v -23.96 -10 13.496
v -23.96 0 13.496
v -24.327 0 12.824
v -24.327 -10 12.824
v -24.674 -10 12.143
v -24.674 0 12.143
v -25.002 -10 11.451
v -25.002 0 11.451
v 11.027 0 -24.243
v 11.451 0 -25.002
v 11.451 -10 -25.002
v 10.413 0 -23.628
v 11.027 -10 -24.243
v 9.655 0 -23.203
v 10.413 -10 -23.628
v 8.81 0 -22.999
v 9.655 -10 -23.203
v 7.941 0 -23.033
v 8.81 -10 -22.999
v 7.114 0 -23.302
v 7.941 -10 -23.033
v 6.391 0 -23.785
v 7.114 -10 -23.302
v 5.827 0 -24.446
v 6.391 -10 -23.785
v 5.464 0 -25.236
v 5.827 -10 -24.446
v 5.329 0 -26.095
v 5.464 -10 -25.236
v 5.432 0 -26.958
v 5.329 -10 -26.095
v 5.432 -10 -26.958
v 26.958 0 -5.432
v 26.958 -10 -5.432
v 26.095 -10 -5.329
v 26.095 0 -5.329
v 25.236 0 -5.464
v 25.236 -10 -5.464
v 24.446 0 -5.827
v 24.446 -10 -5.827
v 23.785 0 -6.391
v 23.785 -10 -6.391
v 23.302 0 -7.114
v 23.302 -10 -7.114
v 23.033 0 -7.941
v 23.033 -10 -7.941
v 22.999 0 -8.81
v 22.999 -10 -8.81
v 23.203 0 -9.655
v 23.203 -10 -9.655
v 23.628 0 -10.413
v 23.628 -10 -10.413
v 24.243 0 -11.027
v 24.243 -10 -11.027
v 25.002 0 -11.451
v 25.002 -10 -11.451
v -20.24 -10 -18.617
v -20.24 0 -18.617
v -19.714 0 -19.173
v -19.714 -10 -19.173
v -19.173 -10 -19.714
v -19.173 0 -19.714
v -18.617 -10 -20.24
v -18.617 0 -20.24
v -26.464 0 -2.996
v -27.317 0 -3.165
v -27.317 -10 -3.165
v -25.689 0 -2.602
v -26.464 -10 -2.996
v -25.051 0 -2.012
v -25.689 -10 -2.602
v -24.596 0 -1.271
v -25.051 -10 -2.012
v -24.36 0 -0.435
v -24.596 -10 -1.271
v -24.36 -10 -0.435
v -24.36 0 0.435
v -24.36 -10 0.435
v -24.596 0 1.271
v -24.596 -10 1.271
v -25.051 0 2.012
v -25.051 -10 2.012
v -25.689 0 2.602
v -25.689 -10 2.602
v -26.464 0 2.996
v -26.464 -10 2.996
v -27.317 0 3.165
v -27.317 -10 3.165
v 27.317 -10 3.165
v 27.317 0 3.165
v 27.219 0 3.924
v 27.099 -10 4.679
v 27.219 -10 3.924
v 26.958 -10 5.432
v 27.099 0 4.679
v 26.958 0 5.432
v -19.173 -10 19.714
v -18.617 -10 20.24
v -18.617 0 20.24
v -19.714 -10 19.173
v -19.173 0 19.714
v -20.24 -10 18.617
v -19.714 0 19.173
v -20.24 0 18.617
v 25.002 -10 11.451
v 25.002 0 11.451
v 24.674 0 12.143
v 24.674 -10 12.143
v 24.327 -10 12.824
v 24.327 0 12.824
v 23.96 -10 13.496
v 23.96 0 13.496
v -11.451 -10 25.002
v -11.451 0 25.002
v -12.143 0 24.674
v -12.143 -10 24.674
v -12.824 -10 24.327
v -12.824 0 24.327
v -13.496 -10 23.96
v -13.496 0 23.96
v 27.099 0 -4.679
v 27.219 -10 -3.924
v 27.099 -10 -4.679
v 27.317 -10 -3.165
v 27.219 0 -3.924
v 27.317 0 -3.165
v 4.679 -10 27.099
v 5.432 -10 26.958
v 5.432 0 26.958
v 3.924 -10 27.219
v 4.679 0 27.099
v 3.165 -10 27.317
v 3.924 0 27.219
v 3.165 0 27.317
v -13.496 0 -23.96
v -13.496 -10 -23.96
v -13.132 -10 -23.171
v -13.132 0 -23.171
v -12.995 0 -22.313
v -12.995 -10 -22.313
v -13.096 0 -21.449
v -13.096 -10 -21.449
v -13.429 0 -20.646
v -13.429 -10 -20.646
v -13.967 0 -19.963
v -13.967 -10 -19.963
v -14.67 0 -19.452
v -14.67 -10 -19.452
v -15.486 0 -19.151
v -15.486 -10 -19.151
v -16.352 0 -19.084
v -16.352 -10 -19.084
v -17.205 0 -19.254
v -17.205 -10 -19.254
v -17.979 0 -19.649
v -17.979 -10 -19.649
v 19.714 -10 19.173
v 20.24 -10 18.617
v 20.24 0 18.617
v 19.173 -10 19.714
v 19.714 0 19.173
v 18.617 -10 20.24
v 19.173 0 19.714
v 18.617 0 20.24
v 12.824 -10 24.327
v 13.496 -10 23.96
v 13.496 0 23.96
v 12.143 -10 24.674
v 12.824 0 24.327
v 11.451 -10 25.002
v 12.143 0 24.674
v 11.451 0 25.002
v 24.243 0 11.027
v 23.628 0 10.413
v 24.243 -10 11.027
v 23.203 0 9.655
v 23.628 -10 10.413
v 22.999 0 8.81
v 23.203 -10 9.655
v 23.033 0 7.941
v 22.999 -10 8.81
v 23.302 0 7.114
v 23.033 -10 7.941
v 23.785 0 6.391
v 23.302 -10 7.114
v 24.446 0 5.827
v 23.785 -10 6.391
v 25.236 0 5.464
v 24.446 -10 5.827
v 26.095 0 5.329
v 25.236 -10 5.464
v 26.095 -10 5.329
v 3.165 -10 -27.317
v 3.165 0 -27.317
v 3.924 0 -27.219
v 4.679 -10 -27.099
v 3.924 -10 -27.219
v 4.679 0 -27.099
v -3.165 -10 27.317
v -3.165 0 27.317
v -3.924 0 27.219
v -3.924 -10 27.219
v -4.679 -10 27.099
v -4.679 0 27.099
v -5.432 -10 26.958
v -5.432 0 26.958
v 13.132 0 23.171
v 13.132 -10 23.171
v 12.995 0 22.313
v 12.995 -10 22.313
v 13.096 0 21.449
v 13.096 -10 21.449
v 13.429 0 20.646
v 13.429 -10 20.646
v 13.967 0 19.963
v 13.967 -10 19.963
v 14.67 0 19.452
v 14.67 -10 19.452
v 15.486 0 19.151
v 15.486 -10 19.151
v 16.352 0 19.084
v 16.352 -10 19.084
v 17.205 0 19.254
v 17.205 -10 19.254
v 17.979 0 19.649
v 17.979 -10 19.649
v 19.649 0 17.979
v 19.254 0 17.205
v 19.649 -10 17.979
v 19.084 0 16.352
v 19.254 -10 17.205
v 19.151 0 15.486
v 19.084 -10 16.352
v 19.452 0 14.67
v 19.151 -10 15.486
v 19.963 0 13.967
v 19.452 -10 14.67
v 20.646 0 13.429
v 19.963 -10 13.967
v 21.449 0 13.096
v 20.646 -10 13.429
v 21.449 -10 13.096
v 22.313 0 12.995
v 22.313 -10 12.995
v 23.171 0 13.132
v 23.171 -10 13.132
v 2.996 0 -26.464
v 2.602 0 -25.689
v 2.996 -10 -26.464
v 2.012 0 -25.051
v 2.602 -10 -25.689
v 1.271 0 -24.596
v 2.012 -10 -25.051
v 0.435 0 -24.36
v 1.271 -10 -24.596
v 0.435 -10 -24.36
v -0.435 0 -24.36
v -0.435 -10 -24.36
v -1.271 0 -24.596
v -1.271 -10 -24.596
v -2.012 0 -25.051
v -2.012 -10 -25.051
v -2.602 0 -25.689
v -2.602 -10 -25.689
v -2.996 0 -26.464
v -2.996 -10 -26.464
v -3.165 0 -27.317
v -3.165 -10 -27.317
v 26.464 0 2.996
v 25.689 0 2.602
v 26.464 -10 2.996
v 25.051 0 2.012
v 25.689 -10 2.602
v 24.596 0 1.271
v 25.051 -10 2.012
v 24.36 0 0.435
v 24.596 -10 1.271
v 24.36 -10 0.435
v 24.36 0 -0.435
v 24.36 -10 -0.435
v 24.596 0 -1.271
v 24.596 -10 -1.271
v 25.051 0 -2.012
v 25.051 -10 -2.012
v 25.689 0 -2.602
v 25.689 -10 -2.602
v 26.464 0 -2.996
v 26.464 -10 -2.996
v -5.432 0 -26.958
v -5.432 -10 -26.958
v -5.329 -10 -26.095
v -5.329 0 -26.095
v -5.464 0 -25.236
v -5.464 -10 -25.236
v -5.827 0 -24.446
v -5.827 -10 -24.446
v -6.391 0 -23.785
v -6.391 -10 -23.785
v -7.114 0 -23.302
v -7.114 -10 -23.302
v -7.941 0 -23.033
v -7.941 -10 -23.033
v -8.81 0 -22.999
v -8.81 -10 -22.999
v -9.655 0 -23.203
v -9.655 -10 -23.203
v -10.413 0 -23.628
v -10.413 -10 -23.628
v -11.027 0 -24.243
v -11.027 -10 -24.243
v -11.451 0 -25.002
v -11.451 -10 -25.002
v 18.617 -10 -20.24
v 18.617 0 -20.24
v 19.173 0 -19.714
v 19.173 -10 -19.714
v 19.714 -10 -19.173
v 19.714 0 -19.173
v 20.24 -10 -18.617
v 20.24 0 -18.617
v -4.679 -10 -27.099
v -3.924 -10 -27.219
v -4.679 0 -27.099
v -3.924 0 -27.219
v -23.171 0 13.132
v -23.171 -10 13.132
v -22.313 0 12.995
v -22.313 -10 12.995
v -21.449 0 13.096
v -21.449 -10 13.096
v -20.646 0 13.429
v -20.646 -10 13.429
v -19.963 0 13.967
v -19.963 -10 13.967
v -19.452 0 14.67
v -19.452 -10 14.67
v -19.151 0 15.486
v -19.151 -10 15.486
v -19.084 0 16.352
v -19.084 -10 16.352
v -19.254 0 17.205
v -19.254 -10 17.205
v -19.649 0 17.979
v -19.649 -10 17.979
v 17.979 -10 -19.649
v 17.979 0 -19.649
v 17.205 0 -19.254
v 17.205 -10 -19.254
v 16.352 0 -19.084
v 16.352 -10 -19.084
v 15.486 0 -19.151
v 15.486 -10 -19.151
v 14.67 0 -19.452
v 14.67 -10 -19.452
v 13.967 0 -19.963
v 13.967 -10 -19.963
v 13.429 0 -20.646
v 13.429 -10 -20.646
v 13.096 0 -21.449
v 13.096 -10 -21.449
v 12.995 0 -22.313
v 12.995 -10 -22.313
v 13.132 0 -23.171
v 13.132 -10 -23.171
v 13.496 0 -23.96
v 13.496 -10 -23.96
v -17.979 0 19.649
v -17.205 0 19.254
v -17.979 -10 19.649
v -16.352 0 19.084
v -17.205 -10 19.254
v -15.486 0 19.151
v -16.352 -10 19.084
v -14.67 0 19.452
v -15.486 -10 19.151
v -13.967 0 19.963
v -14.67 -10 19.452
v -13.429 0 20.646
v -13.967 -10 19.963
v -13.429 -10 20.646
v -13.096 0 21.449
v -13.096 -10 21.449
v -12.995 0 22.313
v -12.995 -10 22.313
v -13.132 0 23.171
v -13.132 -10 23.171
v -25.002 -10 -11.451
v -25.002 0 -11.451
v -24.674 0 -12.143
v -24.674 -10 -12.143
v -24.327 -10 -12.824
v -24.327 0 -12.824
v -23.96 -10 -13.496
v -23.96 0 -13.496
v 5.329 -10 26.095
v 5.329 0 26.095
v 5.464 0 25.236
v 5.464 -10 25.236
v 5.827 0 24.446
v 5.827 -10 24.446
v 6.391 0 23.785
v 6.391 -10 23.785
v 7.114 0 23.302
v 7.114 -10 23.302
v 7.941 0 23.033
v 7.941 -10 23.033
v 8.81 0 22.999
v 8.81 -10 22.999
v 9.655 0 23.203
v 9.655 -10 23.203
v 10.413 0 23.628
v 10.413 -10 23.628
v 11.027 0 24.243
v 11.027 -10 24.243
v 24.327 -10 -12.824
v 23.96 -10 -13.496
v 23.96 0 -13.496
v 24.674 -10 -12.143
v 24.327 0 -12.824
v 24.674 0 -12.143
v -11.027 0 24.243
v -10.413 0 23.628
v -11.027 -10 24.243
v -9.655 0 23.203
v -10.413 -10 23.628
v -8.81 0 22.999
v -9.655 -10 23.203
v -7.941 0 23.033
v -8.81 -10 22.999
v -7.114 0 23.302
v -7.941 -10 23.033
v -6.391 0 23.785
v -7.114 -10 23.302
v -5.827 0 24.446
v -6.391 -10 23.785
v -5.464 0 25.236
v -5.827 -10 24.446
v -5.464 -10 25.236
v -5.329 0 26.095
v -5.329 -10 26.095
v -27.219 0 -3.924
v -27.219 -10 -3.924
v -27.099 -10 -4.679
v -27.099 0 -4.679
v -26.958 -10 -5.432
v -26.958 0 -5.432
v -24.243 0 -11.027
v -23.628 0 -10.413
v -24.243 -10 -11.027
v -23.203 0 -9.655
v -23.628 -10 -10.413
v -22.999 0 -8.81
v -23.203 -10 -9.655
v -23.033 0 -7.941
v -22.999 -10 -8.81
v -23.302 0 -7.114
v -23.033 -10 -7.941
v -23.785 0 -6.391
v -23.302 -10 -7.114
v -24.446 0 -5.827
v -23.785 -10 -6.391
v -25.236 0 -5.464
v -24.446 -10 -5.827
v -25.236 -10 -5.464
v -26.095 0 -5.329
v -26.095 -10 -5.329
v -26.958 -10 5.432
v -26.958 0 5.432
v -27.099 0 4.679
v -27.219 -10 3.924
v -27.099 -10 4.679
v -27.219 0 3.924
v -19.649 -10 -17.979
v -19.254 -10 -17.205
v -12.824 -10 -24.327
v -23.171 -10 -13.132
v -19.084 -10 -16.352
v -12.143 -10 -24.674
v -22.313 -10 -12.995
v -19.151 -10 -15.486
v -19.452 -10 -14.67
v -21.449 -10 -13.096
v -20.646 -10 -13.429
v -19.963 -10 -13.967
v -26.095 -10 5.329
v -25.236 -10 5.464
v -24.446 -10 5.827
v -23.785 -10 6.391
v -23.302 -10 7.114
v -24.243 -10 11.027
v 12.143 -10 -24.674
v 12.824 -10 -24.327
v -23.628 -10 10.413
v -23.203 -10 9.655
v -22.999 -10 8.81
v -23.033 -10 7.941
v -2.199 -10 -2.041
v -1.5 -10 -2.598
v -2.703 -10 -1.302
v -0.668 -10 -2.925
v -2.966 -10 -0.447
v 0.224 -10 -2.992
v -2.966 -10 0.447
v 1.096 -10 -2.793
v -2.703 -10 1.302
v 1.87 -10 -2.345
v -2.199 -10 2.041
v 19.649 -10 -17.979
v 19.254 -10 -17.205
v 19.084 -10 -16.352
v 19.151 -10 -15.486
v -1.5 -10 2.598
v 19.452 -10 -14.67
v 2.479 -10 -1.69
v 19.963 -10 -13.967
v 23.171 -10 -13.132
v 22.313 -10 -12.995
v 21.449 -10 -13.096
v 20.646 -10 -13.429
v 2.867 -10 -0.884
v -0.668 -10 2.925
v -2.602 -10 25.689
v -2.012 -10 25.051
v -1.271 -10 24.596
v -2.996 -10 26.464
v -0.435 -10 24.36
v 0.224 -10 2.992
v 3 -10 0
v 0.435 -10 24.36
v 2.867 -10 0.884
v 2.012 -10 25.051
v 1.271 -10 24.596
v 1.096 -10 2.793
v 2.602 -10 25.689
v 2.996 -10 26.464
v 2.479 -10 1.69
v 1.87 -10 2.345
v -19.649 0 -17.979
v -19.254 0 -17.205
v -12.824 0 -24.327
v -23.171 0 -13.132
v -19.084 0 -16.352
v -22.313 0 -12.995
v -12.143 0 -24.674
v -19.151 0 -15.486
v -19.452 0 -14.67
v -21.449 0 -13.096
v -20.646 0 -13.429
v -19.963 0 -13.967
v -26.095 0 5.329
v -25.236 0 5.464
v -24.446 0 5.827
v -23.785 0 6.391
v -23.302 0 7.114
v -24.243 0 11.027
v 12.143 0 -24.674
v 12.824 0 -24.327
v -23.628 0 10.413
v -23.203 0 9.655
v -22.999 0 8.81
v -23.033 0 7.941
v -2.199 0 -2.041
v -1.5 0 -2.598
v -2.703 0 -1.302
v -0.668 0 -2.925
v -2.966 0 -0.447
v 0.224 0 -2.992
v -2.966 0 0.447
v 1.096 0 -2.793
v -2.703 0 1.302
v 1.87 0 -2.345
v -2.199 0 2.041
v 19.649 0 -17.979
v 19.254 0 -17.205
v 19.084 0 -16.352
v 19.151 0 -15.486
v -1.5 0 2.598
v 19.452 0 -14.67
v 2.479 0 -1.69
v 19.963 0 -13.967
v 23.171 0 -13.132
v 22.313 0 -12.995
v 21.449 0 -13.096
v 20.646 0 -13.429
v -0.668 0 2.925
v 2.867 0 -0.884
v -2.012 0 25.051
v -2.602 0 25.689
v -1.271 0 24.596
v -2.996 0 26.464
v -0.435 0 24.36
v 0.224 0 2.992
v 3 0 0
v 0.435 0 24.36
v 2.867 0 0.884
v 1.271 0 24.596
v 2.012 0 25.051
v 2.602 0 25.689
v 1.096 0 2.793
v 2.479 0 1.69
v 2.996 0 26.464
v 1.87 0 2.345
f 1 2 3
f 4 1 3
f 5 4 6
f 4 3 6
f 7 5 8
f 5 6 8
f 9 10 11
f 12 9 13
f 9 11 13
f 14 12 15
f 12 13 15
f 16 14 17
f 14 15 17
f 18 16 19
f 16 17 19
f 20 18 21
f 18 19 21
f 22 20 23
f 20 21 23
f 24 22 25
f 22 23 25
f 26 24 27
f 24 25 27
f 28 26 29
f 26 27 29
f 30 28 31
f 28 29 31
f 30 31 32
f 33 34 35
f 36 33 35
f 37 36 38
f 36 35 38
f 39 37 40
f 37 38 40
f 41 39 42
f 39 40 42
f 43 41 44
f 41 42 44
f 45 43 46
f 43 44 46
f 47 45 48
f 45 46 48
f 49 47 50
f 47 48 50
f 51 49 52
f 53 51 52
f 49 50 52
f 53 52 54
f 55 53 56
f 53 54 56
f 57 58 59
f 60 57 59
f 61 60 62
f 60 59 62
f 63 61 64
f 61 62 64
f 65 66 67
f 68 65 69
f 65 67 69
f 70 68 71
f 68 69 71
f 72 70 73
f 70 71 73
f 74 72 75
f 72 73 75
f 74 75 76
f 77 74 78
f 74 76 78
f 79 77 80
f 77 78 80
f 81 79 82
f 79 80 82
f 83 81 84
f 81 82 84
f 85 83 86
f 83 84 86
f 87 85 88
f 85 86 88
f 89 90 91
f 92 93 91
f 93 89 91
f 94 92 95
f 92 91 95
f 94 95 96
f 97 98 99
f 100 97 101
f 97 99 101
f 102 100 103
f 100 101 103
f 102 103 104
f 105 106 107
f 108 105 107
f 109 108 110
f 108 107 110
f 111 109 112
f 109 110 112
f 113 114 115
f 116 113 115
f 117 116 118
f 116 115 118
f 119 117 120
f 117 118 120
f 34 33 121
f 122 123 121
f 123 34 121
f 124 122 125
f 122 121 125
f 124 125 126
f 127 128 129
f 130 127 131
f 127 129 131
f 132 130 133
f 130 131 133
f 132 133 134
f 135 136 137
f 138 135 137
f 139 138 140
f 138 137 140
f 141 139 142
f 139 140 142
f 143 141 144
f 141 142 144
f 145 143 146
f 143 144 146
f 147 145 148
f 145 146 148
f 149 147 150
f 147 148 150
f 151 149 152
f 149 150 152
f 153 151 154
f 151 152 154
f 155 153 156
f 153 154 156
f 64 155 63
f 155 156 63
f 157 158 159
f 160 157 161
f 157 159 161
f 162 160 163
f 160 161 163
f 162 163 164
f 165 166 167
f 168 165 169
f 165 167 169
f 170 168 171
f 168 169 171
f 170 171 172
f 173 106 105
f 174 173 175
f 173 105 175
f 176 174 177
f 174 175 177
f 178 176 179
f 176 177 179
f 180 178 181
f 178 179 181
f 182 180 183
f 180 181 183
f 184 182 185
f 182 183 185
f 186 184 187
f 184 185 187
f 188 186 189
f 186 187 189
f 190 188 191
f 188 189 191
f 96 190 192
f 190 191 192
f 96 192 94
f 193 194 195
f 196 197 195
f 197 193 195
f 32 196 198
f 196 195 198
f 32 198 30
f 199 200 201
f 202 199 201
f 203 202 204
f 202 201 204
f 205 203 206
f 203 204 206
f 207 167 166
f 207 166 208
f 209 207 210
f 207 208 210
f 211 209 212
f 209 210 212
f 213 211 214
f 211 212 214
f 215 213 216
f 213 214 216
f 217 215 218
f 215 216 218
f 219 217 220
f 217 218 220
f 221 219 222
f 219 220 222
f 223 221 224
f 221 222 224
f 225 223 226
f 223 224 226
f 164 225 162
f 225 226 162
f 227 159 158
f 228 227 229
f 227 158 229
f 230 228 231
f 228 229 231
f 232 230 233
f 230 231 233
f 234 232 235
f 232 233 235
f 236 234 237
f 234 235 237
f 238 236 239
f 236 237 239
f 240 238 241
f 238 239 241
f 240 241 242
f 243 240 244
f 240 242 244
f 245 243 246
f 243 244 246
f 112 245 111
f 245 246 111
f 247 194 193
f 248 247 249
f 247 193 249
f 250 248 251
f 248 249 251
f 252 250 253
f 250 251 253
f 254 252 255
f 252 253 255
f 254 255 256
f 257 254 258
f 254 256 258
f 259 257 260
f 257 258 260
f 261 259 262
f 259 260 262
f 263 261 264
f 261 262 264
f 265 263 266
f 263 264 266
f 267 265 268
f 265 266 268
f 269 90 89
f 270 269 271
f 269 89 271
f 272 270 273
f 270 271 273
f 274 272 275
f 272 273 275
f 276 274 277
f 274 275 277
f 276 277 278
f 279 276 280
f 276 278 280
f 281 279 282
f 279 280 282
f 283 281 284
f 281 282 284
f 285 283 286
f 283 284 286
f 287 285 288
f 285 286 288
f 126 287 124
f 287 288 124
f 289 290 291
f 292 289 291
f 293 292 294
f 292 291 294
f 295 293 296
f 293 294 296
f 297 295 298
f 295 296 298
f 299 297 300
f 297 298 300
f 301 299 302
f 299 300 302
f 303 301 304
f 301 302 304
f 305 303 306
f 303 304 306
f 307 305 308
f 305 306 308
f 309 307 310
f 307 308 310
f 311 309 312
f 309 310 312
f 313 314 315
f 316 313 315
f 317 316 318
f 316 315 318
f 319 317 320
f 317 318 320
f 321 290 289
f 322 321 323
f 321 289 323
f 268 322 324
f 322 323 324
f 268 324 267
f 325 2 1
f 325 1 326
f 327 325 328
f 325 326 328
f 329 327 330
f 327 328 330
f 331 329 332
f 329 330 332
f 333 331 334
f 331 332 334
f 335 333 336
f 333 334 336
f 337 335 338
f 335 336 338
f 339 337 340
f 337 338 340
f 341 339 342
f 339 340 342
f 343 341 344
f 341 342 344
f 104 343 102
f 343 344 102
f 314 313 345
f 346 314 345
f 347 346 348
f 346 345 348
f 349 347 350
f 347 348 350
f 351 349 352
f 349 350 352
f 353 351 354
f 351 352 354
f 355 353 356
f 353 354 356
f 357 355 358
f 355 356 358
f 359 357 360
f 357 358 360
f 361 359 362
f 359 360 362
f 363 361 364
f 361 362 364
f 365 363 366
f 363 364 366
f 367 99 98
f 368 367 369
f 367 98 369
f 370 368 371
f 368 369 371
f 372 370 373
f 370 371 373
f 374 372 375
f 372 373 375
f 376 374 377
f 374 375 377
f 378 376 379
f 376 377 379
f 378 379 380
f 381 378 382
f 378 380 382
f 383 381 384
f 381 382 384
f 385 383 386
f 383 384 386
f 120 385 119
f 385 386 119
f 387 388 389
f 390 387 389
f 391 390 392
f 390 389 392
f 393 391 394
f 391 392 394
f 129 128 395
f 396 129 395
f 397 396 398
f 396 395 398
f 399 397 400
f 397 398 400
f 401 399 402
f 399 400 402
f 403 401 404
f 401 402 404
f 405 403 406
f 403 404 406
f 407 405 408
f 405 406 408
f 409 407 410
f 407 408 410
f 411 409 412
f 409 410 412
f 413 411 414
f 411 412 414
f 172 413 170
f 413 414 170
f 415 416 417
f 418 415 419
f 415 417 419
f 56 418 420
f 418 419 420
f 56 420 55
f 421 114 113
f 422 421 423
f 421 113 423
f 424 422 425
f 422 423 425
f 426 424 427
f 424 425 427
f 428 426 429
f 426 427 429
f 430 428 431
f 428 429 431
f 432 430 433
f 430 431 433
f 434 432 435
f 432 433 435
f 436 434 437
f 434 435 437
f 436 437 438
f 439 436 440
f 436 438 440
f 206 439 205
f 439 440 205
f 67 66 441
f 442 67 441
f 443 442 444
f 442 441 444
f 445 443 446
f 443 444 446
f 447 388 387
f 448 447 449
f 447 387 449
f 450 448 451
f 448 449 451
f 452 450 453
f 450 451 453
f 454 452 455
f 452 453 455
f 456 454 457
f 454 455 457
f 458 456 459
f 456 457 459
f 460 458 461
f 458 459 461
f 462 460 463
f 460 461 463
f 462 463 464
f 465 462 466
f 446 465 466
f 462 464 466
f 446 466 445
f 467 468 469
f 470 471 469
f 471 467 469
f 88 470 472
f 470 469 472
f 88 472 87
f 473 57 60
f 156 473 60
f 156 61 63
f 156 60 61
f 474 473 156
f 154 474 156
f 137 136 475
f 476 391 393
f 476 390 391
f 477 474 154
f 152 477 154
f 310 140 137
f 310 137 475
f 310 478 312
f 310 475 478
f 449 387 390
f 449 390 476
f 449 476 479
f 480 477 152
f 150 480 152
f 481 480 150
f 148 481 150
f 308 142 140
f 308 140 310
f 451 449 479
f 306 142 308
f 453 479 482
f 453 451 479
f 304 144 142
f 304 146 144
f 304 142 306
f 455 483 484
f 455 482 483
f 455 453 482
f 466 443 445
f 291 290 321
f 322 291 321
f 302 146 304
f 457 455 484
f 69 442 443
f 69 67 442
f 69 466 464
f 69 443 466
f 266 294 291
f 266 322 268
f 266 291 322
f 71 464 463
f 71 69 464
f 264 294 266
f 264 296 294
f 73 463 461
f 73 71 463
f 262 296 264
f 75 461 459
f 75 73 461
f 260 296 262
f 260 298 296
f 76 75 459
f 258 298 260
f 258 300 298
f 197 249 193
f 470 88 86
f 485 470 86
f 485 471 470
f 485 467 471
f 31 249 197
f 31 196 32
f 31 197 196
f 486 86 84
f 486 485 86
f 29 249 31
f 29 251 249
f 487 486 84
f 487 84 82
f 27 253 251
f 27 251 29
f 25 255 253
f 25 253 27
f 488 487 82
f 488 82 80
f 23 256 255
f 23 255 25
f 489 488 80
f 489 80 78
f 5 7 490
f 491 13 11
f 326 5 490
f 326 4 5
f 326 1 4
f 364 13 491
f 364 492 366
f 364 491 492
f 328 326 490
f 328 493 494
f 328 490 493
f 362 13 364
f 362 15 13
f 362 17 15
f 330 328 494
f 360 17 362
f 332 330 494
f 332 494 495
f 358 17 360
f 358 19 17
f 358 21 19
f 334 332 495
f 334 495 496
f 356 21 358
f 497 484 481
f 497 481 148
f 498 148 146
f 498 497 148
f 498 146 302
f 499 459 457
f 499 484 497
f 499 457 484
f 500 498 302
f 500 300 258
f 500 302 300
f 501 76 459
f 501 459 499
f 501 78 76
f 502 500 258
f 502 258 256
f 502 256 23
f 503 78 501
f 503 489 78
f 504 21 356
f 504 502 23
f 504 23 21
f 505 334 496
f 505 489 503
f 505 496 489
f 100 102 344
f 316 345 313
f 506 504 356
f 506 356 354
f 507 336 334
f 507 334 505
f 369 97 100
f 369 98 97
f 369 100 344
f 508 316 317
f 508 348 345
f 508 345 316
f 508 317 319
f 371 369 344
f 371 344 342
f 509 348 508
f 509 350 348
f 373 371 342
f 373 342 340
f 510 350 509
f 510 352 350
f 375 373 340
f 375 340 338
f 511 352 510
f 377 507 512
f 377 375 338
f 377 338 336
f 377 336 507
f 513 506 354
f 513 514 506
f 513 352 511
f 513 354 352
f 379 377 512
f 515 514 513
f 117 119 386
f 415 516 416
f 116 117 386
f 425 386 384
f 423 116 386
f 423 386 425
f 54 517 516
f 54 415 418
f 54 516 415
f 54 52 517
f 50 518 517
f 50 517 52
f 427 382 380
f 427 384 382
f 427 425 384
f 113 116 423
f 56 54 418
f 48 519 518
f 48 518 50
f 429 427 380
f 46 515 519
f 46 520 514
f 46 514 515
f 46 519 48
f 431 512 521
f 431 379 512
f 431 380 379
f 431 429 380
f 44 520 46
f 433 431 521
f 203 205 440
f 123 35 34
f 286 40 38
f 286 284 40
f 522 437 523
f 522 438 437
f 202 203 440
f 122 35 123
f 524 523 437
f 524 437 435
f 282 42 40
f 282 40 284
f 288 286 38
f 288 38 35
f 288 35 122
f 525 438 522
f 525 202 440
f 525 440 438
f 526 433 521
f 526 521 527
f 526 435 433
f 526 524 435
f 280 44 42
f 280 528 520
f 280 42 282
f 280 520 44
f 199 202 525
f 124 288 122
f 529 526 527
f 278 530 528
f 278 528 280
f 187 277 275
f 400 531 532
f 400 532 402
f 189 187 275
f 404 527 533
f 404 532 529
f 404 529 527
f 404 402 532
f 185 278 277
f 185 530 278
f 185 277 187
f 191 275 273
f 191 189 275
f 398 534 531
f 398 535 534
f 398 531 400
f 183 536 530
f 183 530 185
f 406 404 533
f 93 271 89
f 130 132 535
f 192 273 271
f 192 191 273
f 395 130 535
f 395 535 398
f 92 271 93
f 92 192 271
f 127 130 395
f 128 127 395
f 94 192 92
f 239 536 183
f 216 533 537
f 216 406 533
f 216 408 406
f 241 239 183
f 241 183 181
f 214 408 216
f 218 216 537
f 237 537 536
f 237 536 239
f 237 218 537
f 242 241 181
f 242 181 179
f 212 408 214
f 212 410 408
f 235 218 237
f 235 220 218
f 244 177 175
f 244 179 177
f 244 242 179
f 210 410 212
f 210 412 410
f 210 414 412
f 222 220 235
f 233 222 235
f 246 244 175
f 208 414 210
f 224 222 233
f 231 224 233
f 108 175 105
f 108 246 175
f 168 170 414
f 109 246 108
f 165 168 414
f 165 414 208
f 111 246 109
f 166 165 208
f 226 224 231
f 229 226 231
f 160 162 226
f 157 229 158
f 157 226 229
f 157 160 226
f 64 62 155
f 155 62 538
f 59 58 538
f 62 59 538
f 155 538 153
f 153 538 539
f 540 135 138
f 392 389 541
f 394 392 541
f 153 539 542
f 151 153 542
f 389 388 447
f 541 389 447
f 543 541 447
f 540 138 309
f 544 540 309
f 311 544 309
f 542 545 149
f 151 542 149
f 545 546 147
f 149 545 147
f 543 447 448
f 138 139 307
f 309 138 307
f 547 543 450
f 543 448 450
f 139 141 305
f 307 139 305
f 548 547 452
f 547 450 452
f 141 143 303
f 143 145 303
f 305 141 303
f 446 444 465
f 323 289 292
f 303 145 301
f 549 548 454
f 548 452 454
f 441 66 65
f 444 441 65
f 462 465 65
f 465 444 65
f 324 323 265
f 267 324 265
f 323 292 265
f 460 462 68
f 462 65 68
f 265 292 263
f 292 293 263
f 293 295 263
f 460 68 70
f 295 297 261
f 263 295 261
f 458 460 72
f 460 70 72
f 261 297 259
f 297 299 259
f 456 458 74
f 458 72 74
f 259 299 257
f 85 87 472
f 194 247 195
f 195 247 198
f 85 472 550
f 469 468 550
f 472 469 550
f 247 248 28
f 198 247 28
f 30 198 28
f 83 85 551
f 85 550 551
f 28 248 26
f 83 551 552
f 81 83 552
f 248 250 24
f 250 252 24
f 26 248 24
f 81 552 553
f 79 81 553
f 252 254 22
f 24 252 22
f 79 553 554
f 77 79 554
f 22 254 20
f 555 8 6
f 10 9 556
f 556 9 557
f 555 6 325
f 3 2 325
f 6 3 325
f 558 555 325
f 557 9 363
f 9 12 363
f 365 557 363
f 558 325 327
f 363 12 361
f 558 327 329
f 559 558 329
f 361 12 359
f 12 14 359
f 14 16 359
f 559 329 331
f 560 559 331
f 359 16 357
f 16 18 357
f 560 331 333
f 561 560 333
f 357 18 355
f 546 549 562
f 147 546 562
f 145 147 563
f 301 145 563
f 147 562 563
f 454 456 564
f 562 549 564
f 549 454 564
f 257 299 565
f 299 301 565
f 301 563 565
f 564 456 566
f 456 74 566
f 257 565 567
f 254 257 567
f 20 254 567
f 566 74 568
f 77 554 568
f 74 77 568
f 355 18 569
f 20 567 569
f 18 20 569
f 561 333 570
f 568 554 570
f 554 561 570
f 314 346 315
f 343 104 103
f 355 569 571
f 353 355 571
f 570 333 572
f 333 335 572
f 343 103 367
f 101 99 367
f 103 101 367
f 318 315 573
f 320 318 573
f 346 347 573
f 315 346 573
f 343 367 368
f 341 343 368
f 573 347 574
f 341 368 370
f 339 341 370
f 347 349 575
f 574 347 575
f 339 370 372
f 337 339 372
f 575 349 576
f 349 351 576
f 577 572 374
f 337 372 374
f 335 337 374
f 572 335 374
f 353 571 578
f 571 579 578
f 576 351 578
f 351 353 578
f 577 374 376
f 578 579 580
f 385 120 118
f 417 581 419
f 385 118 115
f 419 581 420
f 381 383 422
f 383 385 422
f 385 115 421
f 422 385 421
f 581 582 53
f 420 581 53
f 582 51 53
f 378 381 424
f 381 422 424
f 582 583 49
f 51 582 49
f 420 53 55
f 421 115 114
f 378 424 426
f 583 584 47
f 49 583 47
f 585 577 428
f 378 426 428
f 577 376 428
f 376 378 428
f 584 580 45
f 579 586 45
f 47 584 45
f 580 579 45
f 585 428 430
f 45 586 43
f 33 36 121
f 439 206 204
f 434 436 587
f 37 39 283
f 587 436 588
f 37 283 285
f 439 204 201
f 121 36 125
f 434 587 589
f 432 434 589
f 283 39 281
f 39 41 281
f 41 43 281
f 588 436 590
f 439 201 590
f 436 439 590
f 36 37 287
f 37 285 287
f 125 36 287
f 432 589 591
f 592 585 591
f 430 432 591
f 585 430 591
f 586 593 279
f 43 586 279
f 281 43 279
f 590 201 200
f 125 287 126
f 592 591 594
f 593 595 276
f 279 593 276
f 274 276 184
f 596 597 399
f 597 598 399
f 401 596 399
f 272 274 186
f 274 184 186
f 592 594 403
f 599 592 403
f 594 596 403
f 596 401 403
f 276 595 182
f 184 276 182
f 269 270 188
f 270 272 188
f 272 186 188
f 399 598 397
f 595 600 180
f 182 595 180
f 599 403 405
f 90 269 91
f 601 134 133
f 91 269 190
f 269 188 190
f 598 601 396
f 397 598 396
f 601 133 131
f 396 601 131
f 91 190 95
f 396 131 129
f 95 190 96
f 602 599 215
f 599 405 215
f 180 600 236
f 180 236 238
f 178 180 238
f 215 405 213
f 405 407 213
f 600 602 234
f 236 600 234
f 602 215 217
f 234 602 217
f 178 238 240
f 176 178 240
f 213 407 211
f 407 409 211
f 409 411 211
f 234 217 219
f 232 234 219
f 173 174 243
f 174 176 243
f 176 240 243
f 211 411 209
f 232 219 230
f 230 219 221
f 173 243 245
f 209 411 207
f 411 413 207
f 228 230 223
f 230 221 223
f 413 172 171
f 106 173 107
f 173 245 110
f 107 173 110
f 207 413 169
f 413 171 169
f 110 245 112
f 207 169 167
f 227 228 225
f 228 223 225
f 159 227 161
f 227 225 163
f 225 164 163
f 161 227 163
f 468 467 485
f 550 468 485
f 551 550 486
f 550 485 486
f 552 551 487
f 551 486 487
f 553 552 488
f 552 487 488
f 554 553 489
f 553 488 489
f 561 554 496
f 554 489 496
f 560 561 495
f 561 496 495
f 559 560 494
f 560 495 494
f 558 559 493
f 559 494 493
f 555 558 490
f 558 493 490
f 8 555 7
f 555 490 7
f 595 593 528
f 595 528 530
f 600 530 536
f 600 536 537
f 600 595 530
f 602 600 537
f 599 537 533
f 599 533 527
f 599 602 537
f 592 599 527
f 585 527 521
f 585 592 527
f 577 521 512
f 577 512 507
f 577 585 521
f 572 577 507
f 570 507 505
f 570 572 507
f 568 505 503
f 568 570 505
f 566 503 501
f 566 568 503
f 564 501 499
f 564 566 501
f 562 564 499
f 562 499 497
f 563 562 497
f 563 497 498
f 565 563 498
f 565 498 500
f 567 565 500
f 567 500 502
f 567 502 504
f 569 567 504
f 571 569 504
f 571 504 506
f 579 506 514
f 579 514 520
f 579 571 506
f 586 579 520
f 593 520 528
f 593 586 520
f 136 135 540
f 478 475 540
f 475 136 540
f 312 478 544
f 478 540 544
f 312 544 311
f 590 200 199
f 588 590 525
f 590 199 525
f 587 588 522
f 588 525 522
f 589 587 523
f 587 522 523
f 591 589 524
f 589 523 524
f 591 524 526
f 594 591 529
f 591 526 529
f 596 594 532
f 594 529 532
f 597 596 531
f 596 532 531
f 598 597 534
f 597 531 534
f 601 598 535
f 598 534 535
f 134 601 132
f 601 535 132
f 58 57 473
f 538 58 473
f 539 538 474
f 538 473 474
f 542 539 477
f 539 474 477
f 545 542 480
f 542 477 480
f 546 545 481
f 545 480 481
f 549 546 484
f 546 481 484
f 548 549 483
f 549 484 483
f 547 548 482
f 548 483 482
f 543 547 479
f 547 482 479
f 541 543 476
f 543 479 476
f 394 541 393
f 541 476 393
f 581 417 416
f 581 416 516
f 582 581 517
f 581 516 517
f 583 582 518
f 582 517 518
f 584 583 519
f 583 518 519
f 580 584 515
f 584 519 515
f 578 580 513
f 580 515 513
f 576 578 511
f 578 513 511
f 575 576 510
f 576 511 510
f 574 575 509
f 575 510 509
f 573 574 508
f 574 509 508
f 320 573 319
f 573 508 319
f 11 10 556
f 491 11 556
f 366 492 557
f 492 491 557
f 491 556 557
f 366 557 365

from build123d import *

# Parameters (mm, degrees)
F0_R            = 27.5
F0_R_2          = 3
F1_DEPTH        = 10
F2_R            = 3.17
F3_DEPTH        = 10.001
F3_COPIES_COUNT = 20


# Not quite as in the source:
# - a pattern or mirror of a feature is missing from the dataset's text; its kind, count and spacing are read off the source's solid


with BuildPart() as f1:
    # F0 (on Front) → F1 (new body)
    with BuildSketch(Plane.XZ):
        Circle(F0_R)
        Circle(F0_R_2, mode=Mode.SUBTRACT)
    extrude(amount=F1_DEPTH)

    # F2 (on face) → F3 (cut, through all)
    with BuildSketch(Plane.XZ.offset(10)):
        with Locations((0, 27.5)):
            Circle(F2_R)
    f3 = extrude(amount=-F3_DEPTH, mode=Mode.SUBTRACT)

    # F3_copies: F3 ×20 about axis
    f3_copies_axis = Axis((0, 0, 0), (0, 1, 0))
    for i in range(1, F3_COPIES_COUNT):
        add(f3.rotate(f3_copies_axis, i * 360 / F3_COPIES_COUNT), mode=Mode.SUBTRACT)


solid = f1.part
